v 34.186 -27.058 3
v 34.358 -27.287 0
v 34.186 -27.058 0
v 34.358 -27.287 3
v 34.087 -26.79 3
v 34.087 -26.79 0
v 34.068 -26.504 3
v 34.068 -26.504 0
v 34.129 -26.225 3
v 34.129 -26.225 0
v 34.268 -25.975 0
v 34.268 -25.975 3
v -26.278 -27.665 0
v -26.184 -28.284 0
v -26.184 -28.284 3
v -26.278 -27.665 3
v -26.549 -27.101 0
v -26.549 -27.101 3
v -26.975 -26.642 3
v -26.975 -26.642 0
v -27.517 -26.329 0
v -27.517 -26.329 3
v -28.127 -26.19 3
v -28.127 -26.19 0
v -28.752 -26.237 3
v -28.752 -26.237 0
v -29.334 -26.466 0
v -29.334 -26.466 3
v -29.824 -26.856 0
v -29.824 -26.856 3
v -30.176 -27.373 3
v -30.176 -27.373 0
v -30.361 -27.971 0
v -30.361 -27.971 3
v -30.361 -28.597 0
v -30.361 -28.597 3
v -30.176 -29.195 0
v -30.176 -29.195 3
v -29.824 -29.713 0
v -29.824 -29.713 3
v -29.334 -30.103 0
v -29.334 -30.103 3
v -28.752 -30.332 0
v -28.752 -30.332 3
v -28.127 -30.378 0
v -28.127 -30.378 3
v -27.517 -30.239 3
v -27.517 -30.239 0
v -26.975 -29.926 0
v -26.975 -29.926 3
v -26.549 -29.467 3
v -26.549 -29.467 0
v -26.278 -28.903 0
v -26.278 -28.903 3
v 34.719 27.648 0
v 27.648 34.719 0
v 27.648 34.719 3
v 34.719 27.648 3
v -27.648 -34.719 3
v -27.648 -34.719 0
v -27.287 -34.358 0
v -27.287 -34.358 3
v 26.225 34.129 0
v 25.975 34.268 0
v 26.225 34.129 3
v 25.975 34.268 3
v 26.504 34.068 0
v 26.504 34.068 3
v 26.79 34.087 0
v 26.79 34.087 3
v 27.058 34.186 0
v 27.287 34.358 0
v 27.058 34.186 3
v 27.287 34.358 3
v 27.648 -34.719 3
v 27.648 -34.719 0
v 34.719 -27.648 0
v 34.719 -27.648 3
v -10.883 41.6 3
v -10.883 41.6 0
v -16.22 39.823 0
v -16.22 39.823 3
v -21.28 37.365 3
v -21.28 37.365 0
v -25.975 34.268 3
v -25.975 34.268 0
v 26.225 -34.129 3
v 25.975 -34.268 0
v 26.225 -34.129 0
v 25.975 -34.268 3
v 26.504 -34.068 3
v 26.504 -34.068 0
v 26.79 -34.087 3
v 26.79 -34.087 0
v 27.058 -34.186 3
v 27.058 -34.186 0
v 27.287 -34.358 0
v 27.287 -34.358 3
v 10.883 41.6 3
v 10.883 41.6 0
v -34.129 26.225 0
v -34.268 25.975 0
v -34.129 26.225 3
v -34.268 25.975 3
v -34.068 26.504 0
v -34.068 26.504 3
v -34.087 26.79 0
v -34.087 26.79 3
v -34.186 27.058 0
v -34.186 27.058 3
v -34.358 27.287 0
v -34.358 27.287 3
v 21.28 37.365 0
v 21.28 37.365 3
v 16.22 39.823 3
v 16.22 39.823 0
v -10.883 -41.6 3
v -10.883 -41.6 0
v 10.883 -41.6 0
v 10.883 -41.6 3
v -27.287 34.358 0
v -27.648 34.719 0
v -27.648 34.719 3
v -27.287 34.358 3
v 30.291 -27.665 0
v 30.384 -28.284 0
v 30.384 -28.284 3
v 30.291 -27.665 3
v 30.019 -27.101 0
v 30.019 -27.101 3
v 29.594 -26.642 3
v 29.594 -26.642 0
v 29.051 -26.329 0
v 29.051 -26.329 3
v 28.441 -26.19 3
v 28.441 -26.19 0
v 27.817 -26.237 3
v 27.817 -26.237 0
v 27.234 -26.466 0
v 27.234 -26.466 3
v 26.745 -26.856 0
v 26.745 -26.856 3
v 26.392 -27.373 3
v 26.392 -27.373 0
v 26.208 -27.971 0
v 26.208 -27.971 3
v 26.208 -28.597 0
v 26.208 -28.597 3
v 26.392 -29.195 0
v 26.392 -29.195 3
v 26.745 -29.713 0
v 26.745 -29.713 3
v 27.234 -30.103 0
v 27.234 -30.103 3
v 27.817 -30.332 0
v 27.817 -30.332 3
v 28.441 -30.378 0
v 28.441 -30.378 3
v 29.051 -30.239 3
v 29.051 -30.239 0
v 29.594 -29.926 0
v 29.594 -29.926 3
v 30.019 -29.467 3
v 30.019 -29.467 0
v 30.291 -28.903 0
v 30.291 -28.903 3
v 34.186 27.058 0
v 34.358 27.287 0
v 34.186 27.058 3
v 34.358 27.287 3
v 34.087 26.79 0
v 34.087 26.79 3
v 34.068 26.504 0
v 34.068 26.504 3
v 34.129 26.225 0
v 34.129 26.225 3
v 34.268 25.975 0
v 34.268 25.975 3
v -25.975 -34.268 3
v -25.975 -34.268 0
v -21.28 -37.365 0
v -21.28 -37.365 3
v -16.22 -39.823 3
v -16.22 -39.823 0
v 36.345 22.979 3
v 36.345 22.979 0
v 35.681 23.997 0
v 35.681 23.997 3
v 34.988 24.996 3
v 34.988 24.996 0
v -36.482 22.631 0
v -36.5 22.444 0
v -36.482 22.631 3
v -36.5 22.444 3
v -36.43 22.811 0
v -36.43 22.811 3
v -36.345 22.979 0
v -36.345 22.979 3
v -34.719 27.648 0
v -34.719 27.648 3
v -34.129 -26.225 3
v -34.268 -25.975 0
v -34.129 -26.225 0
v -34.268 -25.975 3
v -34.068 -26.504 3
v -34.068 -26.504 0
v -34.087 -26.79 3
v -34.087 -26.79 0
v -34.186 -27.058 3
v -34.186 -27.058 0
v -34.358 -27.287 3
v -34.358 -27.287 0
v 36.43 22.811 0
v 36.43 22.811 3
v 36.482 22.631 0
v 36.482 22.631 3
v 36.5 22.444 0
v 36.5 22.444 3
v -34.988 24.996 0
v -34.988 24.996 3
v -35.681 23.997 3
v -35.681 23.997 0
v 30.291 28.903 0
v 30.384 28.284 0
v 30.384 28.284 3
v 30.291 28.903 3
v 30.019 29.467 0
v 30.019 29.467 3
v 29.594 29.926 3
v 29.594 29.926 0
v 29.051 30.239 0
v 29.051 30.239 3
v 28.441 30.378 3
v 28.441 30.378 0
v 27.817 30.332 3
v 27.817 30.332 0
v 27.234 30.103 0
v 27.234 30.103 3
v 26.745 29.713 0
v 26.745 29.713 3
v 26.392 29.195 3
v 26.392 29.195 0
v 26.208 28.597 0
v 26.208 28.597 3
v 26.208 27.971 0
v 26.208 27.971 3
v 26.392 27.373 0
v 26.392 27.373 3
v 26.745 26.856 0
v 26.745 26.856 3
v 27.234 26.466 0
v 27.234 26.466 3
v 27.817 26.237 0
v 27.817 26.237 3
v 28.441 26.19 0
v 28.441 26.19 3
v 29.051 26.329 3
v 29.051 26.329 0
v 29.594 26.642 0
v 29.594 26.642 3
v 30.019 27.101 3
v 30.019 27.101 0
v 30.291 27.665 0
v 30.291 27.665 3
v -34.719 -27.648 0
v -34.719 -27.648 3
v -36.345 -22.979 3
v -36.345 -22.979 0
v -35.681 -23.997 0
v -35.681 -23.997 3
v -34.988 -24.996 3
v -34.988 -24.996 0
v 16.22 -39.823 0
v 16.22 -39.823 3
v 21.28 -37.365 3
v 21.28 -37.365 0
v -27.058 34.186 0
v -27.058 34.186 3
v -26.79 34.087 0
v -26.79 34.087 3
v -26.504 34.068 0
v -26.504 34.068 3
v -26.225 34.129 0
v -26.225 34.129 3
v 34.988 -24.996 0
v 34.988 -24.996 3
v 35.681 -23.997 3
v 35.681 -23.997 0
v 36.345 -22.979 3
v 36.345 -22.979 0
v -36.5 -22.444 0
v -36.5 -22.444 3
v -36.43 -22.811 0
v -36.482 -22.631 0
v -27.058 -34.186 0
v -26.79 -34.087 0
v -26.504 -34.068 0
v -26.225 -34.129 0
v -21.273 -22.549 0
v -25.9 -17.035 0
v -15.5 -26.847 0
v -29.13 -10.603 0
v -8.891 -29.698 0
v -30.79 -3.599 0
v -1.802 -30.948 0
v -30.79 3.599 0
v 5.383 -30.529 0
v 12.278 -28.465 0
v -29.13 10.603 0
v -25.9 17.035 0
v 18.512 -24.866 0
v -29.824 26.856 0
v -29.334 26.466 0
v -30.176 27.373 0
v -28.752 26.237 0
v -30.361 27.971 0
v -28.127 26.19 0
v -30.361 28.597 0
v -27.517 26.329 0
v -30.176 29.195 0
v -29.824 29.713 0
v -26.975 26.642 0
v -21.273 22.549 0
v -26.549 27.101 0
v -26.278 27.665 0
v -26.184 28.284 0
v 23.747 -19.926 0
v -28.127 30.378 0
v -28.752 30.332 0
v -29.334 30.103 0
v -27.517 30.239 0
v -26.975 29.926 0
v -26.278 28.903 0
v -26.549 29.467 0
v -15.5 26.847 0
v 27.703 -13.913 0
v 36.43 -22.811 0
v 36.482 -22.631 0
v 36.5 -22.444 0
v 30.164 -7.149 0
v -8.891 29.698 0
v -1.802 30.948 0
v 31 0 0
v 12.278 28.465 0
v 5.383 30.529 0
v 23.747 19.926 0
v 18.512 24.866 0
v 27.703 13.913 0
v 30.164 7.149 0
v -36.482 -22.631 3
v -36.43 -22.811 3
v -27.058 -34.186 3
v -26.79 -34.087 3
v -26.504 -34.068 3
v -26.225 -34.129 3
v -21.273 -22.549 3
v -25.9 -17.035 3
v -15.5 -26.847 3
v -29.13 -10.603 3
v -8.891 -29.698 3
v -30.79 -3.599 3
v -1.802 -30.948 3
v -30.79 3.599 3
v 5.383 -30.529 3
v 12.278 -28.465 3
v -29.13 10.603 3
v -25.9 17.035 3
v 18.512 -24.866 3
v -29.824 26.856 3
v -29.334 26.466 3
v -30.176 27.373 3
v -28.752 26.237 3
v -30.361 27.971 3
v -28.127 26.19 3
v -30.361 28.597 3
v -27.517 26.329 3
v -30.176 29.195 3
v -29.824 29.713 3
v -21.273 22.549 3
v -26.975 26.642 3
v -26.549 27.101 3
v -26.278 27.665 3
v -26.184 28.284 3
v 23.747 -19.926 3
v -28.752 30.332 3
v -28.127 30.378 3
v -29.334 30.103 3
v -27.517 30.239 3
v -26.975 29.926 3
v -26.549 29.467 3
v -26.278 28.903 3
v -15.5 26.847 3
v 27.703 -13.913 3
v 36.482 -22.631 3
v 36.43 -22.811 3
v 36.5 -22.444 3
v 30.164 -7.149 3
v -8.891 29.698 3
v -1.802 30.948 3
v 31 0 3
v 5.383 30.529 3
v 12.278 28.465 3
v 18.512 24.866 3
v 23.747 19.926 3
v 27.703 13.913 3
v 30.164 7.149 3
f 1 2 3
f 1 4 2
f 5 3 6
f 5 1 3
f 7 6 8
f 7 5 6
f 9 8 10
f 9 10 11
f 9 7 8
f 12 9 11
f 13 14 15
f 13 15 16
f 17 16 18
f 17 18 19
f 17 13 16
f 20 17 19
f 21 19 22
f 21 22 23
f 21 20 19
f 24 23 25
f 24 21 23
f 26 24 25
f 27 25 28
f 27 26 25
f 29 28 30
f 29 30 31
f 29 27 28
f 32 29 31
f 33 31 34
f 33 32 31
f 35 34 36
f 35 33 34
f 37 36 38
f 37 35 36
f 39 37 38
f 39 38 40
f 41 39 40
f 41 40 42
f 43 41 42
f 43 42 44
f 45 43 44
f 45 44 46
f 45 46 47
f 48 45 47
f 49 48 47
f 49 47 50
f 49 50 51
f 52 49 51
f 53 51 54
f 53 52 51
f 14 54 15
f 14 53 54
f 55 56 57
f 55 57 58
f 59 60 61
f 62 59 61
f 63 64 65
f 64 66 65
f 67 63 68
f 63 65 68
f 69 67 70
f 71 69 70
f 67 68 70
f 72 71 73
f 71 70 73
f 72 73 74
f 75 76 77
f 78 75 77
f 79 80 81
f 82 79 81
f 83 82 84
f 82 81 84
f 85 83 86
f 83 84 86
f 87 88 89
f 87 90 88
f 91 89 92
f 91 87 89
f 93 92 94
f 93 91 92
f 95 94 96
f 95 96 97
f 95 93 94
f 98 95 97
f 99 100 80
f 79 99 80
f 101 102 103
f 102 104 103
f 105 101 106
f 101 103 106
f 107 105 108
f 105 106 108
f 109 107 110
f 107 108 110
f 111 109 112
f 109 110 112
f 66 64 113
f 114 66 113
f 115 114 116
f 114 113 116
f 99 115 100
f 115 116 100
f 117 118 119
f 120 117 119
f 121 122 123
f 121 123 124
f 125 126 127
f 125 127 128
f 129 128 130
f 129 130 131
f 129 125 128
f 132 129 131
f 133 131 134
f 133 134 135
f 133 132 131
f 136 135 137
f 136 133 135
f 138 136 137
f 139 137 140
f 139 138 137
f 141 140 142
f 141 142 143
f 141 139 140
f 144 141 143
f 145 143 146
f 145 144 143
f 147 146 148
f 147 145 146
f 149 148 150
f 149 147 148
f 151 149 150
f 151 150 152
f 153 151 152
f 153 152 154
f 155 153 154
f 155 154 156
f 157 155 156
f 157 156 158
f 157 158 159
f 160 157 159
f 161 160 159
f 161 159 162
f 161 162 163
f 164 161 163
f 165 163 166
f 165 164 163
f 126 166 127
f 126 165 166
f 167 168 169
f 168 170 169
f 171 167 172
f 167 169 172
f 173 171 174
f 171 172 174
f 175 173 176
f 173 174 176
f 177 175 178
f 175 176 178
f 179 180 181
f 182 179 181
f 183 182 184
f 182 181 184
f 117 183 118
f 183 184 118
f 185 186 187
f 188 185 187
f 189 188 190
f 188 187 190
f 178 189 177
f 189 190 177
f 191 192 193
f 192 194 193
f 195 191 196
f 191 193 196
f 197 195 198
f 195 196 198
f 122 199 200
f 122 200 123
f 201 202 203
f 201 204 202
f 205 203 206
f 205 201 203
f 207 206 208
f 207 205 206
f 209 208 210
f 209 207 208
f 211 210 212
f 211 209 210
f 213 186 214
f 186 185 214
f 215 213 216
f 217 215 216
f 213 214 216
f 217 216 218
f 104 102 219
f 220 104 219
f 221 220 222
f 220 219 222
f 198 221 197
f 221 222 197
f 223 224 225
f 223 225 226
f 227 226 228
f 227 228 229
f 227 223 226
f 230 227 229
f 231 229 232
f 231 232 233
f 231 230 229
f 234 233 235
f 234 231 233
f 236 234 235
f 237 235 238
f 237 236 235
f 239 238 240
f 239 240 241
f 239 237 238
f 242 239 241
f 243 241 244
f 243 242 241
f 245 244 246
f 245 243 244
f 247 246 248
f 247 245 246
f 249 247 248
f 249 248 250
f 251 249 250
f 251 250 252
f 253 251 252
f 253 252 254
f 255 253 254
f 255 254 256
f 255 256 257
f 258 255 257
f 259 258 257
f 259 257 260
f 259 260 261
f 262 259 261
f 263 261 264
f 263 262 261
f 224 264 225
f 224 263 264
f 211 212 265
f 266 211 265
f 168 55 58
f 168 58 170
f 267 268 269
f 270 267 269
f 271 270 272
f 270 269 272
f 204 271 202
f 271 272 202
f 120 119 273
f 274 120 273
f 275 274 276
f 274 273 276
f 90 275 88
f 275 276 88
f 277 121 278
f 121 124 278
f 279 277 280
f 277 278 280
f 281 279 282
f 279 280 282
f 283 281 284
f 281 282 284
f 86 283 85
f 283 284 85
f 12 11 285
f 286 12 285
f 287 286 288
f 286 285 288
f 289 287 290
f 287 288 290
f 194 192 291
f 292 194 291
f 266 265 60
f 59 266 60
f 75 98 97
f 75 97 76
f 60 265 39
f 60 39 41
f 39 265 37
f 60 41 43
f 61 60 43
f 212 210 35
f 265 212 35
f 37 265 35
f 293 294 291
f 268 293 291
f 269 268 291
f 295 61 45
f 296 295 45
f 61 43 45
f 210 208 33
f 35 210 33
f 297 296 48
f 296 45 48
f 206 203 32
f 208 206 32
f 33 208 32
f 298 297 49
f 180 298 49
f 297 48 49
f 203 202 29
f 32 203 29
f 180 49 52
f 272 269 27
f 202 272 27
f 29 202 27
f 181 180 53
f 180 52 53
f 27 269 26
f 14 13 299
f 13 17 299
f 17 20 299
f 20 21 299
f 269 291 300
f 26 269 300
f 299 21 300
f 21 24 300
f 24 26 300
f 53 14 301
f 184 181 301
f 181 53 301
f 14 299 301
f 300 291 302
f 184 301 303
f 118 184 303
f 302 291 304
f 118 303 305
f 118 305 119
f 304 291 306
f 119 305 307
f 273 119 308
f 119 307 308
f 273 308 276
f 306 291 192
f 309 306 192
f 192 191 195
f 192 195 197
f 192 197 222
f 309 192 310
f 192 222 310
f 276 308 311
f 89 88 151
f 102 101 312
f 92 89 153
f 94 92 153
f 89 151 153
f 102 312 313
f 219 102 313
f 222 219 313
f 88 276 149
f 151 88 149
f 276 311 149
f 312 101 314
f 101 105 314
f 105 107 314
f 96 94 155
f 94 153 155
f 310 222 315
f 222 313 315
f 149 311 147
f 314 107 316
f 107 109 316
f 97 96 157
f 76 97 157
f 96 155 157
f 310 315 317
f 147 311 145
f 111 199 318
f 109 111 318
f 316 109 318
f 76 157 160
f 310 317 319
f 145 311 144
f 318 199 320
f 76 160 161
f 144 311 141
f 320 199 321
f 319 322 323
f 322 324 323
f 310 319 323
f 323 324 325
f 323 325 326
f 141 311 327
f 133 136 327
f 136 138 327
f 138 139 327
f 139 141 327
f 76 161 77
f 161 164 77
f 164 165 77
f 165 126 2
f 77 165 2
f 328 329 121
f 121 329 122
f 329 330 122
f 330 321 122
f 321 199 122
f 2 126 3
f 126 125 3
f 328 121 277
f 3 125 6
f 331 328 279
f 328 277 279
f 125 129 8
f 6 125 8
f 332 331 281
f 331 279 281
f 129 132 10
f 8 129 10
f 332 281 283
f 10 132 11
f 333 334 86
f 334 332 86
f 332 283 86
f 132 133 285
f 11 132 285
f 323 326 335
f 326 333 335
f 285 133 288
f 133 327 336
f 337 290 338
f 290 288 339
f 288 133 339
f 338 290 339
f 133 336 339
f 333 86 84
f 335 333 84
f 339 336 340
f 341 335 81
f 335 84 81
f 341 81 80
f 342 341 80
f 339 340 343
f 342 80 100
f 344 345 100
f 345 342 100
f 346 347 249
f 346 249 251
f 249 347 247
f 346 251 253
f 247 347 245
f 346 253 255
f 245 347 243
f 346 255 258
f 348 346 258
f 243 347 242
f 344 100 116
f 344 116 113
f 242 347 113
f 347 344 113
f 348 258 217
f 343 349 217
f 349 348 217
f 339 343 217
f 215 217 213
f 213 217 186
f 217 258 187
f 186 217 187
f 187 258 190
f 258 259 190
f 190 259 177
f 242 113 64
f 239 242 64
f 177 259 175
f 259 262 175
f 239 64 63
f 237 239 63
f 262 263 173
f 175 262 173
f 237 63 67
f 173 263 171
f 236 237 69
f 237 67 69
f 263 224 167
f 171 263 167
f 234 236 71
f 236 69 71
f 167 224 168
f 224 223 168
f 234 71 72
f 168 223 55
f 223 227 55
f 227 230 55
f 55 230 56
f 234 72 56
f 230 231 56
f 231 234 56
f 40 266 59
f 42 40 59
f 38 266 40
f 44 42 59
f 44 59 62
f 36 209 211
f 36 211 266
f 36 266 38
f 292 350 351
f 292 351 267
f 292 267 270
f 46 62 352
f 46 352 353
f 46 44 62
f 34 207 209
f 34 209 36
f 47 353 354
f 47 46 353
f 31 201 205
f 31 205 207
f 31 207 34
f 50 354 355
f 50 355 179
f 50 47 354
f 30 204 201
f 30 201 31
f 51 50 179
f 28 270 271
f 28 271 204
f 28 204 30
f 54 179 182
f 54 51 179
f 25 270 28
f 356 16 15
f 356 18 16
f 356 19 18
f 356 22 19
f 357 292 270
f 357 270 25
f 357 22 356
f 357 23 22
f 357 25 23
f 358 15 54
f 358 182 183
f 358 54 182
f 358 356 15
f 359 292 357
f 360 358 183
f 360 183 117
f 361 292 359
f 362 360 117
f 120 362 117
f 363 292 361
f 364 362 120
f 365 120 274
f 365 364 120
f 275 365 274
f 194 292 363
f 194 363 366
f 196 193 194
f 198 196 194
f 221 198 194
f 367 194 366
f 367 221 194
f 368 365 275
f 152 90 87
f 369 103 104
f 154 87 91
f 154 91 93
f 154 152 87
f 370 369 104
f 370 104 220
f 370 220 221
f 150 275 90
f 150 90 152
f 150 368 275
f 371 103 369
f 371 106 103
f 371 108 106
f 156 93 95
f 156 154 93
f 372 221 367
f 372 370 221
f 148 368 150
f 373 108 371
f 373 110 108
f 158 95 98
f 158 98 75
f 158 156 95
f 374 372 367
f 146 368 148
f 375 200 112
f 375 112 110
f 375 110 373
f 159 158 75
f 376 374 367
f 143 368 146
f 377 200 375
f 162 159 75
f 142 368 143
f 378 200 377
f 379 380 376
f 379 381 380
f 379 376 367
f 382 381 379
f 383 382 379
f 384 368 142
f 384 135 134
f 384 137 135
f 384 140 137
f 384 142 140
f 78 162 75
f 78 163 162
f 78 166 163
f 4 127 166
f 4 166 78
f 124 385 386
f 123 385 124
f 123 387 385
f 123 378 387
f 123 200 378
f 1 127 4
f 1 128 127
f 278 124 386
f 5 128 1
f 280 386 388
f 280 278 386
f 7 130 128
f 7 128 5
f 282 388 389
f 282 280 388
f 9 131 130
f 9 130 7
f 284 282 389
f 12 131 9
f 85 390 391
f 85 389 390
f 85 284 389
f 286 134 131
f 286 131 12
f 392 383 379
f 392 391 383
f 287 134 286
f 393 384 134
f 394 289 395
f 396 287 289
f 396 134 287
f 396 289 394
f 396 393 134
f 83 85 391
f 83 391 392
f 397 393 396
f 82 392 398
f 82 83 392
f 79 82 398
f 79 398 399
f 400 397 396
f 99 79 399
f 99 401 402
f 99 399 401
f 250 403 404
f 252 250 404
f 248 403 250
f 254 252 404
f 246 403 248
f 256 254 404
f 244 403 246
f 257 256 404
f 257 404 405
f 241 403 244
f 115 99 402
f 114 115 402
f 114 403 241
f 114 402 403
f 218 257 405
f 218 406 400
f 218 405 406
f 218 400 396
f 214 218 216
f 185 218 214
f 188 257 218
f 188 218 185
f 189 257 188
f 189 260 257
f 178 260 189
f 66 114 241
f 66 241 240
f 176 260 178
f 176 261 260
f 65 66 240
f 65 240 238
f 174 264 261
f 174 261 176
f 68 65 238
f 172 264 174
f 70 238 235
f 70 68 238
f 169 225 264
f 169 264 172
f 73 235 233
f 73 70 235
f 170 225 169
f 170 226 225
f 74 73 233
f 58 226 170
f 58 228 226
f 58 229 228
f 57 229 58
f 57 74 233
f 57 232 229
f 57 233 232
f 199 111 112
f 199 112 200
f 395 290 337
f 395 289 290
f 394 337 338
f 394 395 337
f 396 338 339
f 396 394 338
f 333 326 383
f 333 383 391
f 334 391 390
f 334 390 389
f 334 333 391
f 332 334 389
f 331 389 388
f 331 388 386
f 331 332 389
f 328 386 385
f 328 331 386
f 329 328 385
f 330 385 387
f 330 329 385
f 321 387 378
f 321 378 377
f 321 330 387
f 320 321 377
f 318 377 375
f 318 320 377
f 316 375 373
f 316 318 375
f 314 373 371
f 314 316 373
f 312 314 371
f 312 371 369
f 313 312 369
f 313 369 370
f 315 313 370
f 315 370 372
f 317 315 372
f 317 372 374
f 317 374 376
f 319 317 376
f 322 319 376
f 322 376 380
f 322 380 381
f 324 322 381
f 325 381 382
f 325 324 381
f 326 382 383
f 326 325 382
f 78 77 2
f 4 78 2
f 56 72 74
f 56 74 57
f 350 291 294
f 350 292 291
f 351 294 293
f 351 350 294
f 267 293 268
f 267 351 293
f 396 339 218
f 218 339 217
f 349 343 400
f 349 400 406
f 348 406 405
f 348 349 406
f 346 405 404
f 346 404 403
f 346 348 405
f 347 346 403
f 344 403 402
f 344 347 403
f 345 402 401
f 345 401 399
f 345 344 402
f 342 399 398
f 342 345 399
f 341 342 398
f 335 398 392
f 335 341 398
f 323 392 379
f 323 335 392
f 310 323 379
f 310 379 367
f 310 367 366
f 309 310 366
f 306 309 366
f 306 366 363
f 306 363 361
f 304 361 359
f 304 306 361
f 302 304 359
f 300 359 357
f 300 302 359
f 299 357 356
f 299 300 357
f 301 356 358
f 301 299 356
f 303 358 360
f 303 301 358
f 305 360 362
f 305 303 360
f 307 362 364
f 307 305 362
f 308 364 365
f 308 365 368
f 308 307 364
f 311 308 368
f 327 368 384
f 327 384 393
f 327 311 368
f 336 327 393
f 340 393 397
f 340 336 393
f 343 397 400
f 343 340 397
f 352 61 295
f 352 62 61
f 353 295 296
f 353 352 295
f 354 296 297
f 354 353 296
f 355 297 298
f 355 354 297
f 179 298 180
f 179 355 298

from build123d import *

# Parameters (mm, degrees)
SKETCH001_R   = 31
SKETCH001_R_2 = 2.1
PAD_DEPTH     = 3
FILLET_R      = 1


with BuildPart() as part:
    # Sketch001 → Pad (new body)
    with BuildSketch(Plane.XY):
        with BuildLine():
            Line((-36.5, 22.732136), (-36.5, -22.732136))
            ThreePointArc((-36.5, -22.732136), (-35.172415, -24.736637), (-33.734872, -26.663804))
            Line((-33.734872, -26.663804), (-34.718943, -27.647875))
            Line((-34.718943, -27.647875), (-27.647875, -34.718943))
            Line((-27.647875, -34.718943), (-26.663804, -33.734872))
            ThreePointArc((-26.663804, -33.734872), (-19.180875, -38.484985), (-10.883014, -41.6))
            Line((-10.883014, -41.6), (10.883014, -41.6))
            ThreePointArc((10.883014, -41.6), (19.180875, -38.484985), (26.663804, -33.734872))
            Line((26.663804, -33.734872), (27.647875, -34.718943))
            Line((27.647875, -34.718943), (34.718943, -27.647875))
            Line((34.718943, -27.647875), (33.734872, -26.663804))
            ThreePointArc((33.734872, -26.663804), (35.172415, -24.736637), (36.5, -22.732136))
            Line((36.5, -22.732136), (36.5, 22.732136))
            ThreePointArc((36.5, 22.732136), (35.172415, 24.736637), (33.734872, 26.663804))
            Line((34.718943, 27.647875), (33.734872, 26.663804))
            Line((27.647875, 34.718943), (34.718943, 27.647875))
            Line((26.663804, 33.734872), (27.647875, 34.718943))
            ThreePointArc((26.663804, 33.734872), (19.180875, 38.484985), (10.883014, 41.6))
            Line((10.883014, 41.6), (-10.883014, 41.6))
            ThreePointArc((-10.883014, 41.6), (-19.180875, 38.484985), (-26.663804, 33.734872))
            Line((-27.647875, 34.718943), (-26.663804, 33.734872))
            Line((-34.718943, 27.647875), (-27.647875, 34.718943))
            Line((-33.734872, 26.663804), (-34.718943, 27.647875))
            ThreePointArc((-33.734872, 26.663804), (-35.172415, 24.736637), (-36.5, 22.732136))
        make_face()
        Circle(SKETCH001_R, mode=Mode.SUBTRACT)
        with Locations((-28.284271, 28.284271)):
            Circle(SKETCH001_R_2, mode=Mode.SUBTRACT)
        with Locations((28.284271, 28.284271)):
            Circle(SKETCH001_R_2, mode=Mode.SUBTRACT)
        with Locations((28.284271, -28.284271)):
            Circle(SKETCH001_R_2, mode=Mode.SUBTRACT)
        with Locations((-28.284271, -28.284271)):
            Circle(SKETCH001_R_2, mode=Mode.SUBTRACT)
    extrude(amount=PAD_DEPTH)

    # Fillet
    fillet_edges = [part.edges().sort_by_distance(p)[0] for p in [
        (-26.663804, 33.734872, 1.5),
        (26.663804, 33.734872, 1.5),
        (33.734872, 26.663804, 1.5),
        (26.663804, -33.734872, 1.5),
        (33.734872, -26.663804, 1.5),
        (-26.663804, -33.734872, 1.5),
        (-33.734872, -26.663804, 1.5),
        (-33.734872, 26.663804, 1.5),
        (-36.5, -22.732136, 1.5),
        (-36.5, 22.732136, 1.5),
        (36.5, 22.732136, 1.5),
        (36.5, -22.732136, 1.5),
    ]]
    fillet(fillet_edges, radius=FILLET_R)


solid = part.part
